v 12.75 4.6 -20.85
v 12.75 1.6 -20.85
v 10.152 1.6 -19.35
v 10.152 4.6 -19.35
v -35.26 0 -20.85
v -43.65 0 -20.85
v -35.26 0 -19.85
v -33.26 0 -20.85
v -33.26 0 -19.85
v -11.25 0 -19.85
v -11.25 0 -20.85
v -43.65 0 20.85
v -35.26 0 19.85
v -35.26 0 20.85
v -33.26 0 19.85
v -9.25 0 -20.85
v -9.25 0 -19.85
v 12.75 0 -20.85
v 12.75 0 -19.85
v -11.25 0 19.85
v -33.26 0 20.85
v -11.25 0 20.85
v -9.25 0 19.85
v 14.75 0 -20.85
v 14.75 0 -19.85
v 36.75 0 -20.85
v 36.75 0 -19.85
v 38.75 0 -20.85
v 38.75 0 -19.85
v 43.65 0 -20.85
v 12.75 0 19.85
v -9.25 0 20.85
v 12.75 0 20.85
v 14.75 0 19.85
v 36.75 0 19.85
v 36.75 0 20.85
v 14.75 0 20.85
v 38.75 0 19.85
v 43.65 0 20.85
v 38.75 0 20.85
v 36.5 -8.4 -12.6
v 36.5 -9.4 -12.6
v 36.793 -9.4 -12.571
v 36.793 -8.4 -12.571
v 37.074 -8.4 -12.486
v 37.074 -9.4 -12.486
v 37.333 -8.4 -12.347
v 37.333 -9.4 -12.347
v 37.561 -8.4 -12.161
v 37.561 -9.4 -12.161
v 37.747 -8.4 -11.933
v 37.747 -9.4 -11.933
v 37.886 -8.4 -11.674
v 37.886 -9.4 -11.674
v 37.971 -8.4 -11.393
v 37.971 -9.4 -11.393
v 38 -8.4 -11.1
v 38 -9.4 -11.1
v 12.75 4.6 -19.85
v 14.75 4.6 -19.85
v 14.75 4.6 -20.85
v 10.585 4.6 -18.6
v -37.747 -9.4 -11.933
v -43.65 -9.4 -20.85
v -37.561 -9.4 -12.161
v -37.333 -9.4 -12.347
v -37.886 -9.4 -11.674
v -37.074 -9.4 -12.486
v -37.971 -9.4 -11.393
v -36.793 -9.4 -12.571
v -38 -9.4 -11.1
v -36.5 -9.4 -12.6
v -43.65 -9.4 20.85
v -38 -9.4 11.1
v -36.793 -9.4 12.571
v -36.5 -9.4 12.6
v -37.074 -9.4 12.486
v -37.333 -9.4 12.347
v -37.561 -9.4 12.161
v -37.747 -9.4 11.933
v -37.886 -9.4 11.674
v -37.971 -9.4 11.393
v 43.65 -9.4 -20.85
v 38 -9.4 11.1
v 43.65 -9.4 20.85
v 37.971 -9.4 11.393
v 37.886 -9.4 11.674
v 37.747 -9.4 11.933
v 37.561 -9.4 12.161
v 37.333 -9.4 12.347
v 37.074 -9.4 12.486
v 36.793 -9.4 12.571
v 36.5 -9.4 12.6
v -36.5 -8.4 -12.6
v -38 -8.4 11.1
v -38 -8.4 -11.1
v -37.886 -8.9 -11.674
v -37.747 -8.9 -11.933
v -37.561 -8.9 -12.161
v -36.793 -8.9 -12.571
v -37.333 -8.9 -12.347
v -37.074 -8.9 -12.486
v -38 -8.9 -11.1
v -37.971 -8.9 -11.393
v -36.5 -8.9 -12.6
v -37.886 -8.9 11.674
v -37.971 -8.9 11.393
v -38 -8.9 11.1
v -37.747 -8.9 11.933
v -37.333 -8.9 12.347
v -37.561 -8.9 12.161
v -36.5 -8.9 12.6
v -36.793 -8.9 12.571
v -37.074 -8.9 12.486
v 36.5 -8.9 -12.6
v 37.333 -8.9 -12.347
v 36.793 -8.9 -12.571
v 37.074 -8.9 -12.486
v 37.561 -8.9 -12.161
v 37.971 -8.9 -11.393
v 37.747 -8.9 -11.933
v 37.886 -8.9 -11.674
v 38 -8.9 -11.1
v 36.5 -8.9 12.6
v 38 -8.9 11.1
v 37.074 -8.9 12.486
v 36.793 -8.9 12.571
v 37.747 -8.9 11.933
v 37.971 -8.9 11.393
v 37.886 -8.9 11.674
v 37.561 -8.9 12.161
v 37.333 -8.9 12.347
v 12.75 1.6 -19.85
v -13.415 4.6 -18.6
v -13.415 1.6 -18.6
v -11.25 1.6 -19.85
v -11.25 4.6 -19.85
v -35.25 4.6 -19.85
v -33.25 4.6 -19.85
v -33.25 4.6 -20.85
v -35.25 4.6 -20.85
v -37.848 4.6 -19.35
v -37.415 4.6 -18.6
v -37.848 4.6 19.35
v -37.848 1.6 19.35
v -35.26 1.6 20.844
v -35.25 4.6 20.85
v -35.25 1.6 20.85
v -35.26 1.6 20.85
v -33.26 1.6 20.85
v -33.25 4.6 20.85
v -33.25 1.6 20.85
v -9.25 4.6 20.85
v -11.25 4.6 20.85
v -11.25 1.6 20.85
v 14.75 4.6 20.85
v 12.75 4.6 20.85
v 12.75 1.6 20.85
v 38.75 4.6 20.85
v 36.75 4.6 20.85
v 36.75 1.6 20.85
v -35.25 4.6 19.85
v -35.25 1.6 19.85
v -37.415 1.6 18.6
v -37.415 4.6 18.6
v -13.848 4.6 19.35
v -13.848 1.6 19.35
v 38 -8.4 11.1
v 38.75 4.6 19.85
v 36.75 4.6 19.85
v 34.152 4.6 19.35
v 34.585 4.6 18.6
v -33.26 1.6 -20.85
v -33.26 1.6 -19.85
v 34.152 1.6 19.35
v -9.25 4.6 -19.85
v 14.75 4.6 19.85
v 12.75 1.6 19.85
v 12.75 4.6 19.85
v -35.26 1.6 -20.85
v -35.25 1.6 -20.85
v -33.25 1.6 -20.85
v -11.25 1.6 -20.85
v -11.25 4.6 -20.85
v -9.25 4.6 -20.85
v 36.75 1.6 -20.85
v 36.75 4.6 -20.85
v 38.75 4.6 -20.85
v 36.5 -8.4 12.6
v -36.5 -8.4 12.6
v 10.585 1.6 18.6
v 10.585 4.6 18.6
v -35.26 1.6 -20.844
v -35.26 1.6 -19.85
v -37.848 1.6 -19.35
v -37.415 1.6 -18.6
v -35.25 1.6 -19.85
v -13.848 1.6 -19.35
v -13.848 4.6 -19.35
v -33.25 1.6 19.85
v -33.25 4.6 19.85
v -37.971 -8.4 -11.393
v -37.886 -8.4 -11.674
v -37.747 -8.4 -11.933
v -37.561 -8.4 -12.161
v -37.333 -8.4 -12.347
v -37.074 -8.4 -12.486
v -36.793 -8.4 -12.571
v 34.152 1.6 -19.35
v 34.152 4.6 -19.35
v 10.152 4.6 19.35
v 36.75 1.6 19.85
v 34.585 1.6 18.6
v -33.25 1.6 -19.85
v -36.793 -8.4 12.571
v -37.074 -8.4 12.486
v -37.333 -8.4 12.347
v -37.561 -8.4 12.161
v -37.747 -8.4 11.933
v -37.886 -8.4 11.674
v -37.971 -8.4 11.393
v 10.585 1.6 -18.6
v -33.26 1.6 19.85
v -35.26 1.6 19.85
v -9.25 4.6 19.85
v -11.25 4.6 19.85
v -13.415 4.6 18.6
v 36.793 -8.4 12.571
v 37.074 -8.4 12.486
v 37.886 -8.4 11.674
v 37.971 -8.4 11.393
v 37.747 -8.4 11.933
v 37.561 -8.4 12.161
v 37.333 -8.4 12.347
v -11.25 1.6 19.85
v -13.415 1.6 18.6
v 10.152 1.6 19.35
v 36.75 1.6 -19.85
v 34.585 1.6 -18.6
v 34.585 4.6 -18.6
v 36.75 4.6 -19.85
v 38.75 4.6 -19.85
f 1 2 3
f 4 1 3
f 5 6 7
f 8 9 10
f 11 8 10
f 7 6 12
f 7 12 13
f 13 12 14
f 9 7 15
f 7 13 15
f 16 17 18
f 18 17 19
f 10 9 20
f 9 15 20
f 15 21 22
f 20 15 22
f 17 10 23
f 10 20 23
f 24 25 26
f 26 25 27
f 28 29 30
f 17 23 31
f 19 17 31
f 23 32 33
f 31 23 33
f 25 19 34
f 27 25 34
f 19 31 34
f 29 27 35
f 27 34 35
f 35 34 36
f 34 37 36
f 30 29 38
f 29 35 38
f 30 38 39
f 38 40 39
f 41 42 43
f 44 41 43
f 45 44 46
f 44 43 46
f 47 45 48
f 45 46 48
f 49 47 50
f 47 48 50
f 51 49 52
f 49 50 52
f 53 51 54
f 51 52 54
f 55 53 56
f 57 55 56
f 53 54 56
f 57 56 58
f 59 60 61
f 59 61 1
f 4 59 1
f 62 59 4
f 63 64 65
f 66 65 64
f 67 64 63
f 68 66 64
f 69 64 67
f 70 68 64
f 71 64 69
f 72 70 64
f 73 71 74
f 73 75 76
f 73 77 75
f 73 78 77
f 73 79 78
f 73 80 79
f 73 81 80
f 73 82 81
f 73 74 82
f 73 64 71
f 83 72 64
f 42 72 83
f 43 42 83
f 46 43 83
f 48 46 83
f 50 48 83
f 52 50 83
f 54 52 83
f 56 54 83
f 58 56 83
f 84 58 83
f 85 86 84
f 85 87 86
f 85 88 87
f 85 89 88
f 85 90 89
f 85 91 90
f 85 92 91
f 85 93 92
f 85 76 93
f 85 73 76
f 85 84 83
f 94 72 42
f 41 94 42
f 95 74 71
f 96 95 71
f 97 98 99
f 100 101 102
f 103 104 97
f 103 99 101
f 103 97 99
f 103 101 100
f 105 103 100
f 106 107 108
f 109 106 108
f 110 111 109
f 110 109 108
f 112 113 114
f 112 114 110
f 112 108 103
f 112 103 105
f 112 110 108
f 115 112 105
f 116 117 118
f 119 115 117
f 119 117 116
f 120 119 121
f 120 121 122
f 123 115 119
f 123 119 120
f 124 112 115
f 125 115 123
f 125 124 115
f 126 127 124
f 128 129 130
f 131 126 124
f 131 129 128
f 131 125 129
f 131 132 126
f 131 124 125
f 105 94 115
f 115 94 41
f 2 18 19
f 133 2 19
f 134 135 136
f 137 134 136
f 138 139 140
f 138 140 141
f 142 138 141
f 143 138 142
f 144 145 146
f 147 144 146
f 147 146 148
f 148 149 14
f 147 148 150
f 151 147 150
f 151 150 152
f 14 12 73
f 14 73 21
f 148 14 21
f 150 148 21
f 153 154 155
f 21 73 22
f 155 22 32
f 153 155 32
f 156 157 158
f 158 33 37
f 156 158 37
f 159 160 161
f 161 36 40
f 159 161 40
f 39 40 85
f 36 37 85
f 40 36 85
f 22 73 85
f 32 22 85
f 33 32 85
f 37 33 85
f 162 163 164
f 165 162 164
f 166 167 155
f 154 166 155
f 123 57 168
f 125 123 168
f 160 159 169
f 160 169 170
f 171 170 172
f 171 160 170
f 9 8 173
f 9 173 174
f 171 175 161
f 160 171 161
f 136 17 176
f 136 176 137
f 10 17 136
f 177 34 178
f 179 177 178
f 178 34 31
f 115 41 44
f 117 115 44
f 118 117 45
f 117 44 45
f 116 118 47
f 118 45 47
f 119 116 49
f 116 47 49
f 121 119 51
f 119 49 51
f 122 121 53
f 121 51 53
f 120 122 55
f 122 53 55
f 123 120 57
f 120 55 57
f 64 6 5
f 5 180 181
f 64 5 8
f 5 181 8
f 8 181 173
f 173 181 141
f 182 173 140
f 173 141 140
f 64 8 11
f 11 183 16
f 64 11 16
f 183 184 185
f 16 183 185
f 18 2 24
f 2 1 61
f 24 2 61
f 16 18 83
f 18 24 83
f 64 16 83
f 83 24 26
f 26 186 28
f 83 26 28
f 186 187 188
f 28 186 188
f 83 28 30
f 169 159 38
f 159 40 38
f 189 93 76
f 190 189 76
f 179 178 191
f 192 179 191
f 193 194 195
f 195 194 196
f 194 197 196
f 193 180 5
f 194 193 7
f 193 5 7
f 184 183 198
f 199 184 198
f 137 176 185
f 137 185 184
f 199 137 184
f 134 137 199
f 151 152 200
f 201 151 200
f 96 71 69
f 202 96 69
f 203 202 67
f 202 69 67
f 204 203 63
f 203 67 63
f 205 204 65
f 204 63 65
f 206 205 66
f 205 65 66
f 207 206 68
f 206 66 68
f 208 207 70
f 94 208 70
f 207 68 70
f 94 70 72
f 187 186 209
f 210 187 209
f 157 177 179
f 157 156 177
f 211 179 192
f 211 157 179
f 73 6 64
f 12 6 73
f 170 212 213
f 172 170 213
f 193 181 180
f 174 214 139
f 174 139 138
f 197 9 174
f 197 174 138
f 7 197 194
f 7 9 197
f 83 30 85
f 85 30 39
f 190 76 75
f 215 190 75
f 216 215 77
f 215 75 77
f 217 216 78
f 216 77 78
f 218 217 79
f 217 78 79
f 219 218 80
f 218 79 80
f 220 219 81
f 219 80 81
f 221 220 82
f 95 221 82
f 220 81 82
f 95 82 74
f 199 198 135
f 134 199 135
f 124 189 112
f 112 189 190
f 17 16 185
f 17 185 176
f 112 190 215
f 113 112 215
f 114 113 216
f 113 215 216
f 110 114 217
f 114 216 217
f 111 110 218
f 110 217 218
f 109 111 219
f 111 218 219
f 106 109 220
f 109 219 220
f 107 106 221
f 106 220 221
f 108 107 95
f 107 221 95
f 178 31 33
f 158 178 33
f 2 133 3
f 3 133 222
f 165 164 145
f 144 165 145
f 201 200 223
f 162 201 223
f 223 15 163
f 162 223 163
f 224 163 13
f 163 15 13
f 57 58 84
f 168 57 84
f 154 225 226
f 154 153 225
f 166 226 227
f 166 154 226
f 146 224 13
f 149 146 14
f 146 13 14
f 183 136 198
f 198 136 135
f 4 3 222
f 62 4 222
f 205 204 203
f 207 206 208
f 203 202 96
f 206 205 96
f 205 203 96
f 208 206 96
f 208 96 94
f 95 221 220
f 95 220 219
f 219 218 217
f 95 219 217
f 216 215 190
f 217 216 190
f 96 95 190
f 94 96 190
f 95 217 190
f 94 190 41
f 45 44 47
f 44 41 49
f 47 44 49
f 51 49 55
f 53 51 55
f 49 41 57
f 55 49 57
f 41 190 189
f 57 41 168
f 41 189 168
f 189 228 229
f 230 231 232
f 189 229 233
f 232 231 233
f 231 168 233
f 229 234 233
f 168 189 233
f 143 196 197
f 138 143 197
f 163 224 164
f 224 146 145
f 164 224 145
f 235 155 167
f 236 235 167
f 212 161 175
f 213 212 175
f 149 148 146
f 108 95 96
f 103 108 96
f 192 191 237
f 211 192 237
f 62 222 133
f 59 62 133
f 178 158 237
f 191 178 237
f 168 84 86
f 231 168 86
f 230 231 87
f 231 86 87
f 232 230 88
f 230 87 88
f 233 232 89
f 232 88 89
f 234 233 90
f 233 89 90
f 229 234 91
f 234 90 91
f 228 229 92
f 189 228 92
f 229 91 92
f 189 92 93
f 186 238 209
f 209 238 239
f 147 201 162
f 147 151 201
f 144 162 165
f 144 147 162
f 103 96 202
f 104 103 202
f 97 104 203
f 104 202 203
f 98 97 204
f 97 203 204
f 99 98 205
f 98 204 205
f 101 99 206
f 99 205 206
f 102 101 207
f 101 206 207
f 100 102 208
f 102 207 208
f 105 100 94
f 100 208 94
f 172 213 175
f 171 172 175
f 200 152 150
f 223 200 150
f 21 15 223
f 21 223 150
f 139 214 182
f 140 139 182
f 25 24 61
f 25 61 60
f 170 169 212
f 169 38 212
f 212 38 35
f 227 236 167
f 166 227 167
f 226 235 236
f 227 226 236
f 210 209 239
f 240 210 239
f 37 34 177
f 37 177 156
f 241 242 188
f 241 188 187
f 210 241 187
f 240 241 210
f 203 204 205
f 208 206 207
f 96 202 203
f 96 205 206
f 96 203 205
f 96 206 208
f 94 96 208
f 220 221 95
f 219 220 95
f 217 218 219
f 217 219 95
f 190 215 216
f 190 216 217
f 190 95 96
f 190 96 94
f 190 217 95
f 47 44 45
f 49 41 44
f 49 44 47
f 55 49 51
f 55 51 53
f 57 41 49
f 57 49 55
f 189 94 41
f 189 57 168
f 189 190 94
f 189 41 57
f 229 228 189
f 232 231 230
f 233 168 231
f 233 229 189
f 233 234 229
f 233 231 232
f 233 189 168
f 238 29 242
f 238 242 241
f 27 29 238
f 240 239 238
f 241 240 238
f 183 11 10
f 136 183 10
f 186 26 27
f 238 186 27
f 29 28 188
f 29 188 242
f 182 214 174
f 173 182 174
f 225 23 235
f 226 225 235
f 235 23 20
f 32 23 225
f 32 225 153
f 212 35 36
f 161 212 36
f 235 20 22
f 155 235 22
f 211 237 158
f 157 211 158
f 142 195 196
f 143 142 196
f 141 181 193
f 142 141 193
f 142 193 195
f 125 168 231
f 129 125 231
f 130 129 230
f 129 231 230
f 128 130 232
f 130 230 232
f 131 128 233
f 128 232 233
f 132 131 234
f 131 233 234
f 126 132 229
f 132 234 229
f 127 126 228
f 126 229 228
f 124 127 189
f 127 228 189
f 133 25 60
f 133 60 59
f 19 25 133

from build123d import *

# Parameters (mm, degrees)
F0_W     = 87.3
F0_H     = 41.7
F1_DEPTH = 9.4
F3_DEPTH = 1
F5_DEPTH = 0.5
F6_W     = 2
F6_H     = 1
F7_DEPTH = 1.6
F9_DEPTH = 3


with BuildPart() as f1:
    # F0 (on Front) → F1 (new body)
    with BuildSketch(Plane.XZ):
        Rectangle(F0_W, F0_H)
    extrude(amount=F1_DEPTH)

    # F2 (on face) → F3 (cut)
    with BuildSketch(Plane.XZ.offset(9.4)):
        with BuildLine():
            ThreePointArc((38, 11.1), (37.56066, 12.16066), (36.5, 12.6))
            Line((36.5, 12.6), (-36.5, 12.6))
            ThreePointArc((-36.5, 12.6), (-37.56066, 12.16066), (-38, 11.1))
            Line((-38, 11.1), (-38, -11.1))
            ThreePointArc((-38, -11.1), (-37.56066, -12.16066), (-36.5, -12.6))
            Line((-36.5, -12.6), (36.5, -12.6))
            ThreePointArc((36.5, -12.6), (37.56066, -12.16066), (38, -11.1))
            Line((38, -11.1), (38, 11.1))
        make_face()
    extrude(amount=-F3_DEPTH, mode=Mode.SUBTRACT)

    # F6 (on face) → F7 (join)
    with BuildSketch(Plane(origin=(0, 0, 0), x_dir=(-1, 0, 0), z_dir=(0, 1, 0))):
        with Locations((10.25, 20.35)):
            Rectangle(F6_W, F6_H)
        with Locations((34.26, 20.35)):
            Rectangle(F6_W, F6_H)
        with Locations((-37.75, 20.35)):
            Rectangle(F6_W, F6_H)
        with Locations((-13.75, 20.35)):
            Rectangle(F6_W, F6_H)
        with Locations((-13.75, -20.35)):
            Rectangle(F6_W, F6_H)
        with Locations((-37.75, -20.35)):
            Rectangle(F6_W, F6_H)
        with Locations((34.26, -20.35)):
            Rectangle(F6_W, F6_H)
        with Locations((10.25, -20.35)):
            Rectangle(F6_W, F6_H)
    extrude(amount=F7_DEPTH)

    # F8 (on face) → F9 (join)
    with BuildSketch(Plane(origin=(0, 1.6, 0), x_dir=(-1, 0, 0), z_dir=(0, 1, 0))):
        Polygon((-36.75, 20.85), (-38.75, 20.85), (-38.75, 19.85), (-36.75, 19.85), (-34.584936, 18.6), (-34.151924, 19.35), align=None)
        Polygon((-14.75, 19.85), (-12.75, 19.85), (-10.584936, 18.6), (-10.151924, 19.35), (-12.75, 20.85), (-14.75, 20.85), align=None)
        Polygon((9.25, 19.85), (11.25, 19.85), (13.415064, 18.6), (13.848076, 19.35), (11.25, 20.85), (9.25, 20.85), align=None)
        Polygon((33.25, 19.85), (35.25, 19.85), (37.415064, 18.6), (37.848076, 19.35), (35.25, 20.85), (33.25, 20.85), align=None)
        Polygon((-38.75, -19.85), (-38.75, -20.85), (-36.75, -20.85), (-34.151924, -19.35), (-34.584936, -18.6), (-36.75, -19.85), align=None)
        Polygon((-14.75, -19.85), (-14.75, -20.85), (-12.75, -20.85), (-10.151924, -19.35), (-10.584936, -18.6), (-12.75, -19.85), align=None)
        Polygon((11.25, -19.85), (9.25, -19.85), (9.25, -20.85), (11.25, -20.85), (13.848076, -19.35), (13.415064, -18.6), align=None)
        Polygon((37.415064, -18.6), (35.25, -19.85), (33.25, -19.85), (33.25, -20.85), (35.25, -20.85), (37.848076, -19.35), align=None)
    extrude(amount=F9_DEPTH)


with BuildPart() as f5:
    # F4 (on face) → F5 (new body)
    with BuildSketch(Plane.XZ.offset(8.4)):
        with BuildLine():
            ThreePointArc((-36.5, 12.6), (-37.56066, 12.16066), (-38, 11.1))
            Line((-38, 11.1), (-38, -11.1))
            ThreePointArc((-38, -11.1), (-37.56066, -12.16066), (-36.5, -12.6))
            Line((-36.5, -12.6), (36.5, -12.6))
            ThreePointArc((36.5, -12.6), (37.56066, -12.16066), (38, -11.1))
            Line((38, -11.1), (38, 11.1))
            ThreePointArc((38, 11.1), (37.56066, 12.16066), (36.5, 12.6))
            Line((36.5, 12.6), (-36.5, 12.6))
        make_face()
    extrude(amount=F5_DEPTH)


solid = Compound([f1.part, f5.part])
